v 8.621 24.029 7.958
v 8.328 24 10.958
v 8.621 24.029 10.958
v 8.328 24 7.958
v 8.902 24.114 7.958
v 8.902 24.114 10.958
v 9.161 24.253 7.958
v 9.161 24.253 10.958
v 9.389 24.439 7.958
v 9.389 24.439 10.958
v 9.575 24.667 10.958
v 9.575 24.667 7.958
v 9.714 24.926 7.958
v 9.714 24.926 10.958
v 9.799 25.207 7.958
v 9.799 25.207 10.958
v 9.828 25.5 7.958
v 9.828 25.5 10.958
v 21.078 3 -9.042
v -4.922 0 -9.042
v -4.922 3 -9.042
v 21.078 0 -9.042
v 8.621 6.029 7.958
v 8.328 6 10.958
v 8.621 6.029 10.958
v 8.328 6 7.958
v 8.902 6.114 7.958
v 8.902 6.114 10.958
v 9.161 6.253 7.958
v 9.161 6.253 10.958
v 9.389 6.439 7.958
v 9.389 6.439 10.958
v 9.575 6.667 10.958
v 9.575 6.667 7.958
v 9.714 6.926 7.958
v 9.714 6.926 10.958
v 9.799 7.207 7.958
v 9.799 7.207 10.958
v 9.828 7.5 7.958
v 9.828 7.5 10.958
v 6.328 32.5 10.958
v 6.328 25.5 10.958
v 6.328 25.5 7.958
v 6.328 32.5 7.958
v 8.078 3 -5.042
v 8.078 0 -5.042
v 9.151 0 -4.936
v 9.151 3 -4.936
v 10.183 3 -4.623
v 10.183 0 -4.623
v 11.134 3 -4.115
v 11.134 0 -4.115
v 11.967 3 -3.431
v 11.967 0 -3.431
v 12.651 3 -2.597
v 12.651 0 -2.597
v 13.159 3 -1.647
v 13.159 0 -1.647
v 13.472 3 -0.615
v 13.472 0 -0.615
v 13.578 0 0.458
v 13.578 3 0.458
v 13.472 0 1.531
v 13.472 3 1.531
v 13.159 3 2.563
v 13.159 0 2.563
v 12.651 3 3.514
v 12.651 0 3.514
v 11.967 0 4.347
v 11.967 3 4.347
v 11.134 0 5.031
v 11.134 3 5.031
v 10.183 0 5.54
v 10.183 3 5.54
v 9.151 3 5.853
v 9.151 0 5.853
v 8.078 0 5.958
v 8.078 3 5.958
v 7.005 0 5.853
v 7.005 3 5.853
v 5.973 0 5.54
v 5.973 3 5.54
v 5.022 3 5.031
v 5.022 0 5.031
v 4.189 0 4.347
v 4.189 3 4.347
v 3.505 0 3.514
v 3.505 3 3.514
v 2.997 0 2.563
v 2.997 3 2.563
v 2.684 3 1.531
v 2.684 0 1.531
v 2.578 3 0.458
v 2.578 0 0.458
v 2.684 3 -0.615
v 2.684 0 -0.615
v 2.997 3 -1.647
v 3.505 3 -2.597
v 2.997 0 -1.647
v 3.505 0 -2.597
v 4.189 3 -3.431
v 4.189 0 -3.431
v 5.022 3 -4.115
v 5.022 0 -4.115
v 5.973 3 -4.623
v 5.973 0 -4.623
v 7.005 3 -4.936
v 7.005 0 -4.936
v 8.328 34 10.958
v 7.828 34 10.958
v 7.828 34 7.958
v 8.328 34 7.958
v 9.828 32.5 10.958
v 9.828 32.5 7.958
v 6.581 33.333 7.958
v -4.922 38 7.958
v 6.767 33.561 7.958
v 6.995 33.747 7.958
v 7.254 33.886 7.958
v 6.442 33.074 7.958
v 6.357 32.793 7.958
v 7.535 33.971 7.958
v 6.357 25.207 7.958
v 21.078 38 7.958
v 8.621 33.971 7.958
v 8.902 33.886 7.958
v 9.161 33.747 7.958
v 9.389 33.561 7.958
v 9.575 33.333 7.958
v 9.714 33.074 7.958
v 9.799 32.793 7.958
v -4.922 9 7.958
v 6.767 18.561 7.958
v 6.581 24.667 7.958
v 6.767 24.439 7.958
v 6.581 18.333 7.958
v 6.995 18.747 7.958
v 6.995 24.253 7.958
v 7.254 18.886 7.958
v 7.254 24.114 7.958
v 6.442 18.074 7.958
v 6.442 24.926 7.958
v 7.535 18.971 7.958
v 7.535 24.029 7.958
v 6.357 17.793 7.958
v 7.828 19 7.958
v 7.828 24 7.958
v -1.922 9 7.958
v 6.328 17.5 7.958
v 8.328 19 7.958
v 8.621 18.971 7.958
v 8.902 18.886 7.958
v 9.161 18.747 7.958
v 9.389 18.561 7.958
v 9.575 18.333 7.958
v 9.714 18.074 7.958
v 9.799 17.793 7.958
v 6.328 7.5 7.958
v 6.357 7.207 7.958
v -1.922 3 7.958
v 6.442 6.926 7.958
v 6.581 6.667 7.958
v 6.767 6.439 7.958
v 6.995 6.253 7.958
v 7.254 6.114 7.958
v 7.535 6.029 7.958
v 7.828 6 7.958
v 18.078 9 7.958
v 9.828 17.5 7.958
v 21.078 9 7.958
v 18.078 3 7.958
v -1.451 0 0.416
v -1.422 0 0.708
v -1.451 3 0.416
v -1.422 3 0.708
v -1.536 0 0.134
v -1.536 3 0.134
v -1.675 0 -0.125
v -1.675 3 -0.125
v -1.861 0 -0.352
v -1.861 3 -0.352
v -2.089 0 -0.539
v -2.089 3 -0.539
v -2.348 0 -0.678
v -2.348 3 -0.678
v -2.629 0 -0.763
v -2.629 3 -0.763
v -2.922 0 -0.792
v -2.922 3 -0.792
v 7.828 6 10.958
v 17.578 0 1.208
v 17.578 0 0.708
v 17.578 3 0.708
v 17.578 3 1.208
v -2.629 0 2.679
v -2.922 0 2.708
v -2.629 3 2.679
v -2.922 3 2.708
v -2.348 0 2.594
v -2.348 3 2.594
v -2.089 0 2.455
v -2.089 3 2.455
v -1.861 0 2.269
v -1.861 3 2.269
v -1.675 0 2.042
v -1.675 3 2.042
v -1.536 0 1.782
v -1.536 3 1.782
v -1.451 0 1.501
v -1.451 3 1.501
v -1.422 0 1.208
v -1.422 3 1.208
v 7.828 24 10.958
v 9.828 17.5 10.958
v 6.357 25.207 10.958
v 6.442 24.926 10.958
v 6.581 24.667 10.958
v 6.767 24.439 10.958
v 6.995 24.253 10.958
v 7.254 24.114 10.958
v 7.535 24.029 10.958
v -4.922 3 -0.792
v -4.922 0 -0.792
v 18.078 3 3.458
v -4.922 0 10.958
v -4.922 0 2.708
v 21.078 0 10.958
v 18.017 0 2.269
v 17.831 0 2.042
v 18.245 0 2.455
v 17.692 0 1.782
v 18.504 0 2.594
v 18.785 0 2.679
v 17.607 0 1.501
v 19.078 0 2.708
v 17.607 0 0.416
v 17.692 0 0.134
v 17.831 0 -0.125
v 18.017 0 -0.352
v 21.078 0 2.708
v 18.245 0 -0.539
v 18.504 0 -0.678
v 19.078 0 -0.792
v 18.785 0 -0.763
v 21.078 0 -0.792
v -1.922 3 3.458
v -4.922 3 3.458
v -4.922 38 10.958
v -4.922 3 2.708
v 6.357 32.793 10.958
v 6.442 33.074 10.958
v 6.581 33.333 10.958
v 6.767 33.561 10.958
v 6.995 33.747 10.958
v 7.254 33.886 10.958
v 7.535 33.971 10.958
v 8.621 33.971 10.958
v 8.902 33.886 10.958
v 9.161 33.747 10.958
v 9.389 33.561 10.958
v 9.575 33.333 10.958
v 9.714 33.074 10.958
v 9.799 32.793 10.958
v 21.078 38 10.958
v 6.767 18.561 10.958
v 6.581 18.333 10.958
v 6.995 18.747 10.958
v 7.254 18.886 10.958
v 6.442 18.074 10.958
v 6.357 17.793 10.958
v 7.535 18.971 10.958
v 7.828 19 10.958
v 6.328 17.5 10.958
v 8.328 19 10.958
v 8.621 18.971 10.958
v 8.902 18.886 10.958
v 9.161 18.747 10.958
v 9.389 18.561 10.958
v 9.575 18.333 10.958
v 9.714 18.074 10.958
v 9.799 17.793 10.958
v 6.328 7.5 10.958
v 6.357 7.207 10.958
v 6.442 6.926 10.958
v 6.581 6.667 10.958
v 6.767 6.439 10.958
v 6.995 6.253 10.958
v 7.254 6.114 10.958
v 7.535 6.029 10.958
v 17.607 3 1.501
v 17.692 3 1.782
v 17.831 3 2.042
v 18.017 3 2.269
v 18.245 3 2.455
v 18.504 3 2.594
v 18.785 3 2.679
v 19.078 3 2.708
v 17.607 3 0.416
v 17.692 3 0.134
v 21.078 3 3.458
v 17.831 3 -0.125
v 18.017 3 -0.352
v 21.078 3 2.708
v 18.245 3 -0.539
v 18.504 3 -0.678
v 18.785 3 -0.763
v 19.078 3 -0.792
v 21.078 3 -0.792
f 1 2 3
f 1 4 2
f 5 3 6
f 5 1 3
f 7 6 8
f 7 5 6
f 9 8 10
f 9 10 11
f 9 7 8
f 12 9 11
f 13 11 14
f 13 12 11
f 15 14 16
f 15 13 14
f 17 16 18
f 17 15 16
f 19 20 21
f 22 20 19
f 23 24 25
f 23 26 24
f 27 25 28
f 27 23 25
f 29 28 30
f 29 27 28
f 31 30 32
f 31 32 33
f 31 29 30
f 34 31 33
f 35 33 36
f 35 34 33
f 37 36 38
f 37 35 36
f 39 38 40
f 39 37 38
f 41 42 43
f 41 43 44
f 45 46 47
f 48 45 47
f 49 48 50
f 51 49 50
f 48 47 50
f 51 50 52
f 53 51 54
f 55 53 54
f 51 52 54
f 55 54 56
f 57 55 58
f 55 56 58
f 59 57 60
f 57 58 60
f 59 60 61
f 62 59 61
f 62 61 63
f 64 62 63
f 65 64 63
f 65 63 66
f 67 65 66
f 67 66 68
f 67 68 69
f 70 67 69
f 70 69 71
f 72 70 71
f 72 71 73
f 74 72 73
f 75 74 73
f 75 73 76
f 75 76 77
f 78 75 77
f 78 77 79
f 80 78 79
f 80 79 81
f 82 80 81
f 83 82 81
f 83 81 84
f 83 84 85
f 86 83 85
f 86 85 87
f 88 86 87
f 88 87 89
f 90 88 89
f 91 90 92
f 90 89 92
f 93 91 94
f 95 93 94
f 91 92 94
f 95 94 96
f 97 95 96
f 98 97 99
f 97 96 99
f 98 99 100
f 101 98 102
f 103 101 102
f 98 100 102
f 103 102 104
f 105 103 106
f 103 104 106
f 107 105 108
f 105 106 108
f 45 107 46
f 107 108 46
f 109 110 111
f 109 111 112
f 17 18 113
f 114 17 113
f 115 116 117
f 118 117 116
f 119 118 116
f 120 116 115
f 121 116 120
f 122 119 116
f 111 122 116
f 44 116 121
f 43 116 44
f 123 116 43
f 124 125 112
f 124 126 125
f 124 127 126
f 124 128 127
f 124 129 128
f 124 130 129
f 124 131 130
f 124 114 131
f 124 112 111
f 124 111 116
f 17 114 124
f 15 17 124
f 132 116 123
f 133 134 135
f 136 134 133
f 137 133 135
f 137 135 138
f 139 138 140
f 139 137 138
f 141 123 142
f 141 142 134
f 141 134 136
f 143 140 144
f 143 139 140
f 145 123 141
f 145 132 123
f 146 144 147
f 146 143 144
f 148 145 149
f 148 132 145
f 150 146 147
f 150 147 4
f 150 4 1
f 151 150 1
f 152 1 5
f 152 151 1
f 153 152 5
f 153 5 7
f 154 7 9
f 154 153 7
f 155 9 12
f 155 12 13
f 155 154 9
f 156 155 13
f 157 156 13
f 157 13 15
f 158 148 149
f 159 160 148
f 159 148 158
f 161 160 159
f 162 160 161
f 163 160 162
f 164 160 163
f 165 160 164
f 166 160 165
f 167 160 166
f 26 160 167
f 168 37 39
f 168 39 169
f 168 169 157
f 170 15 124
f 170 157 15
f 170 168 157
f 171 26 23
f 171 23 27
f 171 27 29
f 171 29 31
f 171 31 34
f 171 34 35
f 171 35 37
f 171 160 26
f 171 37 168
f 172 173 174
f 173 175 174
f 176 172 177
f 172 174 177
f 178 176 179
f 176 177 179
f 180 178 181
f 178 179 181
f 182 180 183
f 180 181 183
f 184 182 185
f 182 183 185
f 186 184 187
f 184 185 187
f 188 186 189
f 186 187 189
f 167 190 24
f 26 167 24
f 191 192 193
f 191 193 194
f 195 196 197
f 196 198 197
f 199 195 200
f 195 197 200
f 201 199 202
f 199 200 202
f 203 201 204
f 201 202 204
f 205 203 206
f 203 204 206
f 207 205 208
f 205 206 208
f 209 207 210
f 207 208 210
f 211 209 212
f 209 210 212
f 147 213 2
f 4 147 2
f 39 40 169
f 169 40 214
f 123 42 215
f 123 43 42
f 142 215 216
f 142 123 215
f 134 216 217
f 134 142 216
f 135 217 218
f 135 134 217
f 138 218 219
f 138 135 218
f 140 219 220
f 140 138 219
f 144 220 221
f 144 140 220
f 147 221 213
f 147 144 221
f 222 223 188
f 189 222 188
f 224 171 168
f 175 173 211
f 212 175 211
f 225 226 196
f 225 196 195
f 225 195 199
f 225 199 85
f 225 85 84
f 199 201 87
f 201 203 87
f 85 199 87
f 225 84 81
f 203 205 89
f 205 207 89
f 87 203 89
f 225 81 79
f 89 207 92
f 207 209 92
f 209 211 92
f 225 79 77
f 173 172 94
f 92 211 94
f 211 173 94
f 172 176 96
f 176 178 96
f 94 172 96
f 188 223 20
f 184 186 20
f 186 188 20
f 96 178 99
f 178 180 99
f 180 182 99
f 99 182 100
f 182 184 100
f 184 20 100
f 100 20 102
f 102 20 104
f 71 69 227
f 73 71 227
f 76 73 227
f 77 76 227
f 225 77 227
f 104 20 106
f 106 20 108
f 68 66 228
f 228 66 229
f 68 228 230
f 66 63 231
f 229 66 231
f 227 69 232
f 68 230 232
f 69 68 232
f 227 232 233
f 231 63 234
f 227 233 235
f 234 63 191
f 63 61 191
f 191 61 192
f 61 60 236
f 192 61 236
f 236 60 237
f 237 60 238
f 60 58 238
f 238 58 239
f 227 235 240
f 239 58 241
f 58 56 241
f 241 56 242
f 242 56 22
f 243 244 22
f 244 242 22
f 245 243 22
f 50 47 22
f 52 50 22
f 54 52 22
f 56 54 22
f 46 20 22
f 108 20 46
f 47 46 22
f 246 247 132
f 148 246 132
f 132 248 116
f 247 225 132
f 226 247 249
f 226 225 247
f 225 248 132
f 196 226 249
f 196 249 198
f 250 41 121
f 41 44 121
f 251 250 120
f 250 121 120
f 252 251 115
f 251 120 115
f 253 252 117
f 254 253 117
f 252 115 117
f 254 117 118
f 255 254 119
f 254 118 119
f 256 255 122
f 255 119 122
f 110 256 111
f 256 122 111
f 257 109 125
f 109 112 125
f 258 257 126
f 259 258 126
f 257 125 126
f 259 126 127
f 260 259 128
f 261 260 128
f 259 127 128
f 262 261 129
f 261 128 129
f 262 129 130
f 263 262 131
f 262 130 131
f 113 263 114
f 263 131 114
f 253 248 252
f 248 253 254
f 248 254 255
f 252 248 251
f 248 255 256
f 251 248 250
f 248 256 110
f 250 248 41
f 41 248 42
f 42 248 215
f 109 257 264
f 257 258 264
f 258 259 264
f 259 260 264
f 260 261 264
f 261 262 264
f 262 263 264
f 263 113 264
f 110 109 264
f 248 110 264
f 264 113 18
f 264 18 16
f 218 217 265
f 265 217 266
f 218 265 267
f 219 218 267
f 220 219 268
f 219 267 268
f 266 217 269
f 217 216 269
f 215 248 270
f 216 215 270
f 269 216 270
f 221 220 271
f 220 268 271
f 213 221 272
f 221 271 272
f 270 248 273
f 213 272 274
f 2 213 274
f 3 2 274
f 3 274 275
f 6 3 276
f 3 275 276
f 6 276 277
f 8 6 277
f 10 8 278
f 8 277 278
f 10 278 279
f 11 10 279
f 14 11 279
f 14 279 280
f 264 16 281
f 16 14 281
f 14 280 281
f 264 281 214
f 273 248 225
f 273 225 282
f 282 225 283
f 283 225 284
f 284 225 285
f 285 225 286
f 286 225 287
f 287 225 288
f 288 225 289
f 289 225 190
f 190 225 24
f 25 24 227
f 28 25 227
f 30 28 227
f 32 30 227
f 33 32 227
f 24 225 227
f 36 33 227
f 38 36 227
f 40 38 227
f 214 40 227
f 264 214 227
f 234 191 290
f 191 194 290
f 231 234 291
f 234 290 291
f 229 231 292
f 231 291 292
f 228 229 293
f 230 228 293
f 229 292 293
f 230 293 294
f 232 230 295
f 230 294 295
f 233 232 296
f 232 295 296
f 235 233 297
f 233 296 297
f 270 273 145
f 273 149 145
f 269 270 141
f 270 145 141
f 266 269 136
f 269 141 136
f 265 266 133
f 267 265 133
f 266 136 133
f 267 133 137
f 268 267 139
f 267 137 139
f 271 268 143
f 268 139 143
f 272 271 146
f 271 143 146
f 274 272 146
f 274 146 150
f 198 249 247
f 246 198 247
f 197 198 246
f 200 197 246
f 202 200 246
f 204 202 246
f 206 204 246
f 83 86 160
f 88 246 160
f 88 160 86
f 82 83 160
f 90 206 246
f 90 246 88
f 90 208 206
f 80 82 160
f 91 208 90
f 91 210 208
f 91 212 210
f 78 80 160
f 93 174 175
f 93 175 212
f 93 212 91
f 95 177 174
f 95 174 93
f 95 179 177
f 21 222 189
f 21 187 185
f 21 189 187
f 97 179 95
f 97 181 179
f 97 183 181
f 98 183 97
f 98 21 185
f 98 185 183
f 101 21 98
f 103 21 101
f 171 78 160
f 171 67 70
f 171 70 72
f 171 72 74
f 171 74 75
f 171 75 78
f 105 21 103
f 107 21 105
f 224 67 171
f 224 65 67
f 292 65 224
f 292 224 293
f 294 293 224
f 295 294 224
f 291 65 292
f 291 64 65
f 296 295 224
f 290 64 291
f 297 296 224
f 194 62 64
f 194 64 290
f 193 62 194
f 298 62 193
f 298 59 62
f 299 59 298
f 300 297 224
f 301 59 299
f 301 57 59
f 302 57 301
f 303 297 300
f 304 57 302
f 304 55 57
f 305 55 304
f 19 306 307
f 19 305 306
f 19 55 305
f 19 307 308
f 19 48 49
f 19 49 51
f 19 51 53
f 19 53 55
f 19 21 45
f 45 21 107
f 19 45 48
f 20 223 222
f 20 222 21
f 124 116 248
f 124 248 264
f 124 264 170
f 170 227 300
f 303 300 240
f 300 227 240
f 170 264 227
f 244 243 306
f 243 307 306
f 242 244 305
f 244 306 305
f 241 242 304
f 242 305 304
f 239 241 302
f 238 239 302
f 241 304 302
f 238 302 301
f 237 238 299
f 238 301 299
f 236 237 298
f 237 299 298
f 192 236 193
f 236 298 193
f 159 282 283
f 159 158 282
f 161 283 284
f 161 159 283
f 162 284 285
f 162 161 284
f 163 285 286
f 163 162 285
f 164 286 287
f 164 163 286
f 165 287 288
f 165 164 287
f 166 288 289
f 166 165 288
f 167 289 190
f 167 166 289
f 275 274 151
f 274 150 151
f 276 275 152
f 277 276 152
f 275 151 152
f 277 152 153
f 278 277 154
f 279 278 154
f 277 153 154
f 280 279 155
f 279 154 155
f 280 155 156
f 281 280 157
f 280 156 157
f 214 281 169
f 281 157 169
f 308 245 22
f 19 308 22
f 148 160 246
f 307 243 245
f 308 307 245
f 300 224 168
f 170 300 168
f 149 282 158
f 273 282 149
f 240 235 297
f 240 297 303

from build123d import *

# Parameters (mm, degrees)
ESBO_O1_W                = 26
ESBO_O1_H                = 20
RESSALTO_EXTRUS_O1_DEPTH = 3
ESBO_O2_W                = 26
ESBO_O2_H                = 3
RESSALTO_EXTRUS_O2_DEPTH = 35
ESBO_O3_W                = 3
ESBO_O3_H                = 4.5
RESSALTO_EXTRUS_O3_DEPTH = 6
CORTE_EXTRUS_O1_DEPTH    = 48.329507785
CORTE_EXTRUS_O2_REACH    = 49.836
ESBO_O5_W                = 3.5
ESBO_O5_H                = 10
ESBO_O5_H_2              = 13
FILETE2_R                = 1.5
FILETE3_R                = 1.5
FILETE4_R                = 1.5
CORTE_EXTRUS_O3_REACH    = 46.815
ESBO_O6_W                = 7
ESBO_O6_H                = 3.5
FILETE5_R                = 1.5
CORTE_EXTRUS_O4_REACH    = 46.815
ESBO_O7_R                = 5.5


with BuildPart() as part:
    # Esboço1 → Ressalto-extrusão1 (new body)
    with BuildSketch(Plane(origin=(0, 0, 0), x_dir=(1, 0, 0), z_dir=(0, 1, 0))):
        with Locations((8.077993659, -0.958207295)):
            Rectangle(ESBO_O1_W, ESBO_O1_H)
    extrude(amount=RESSALTO_EXTRUS_O1_DEPTH)

    # Esboço2 → Ressalto-extrusão2 (add)
    with BuildSketch(Plane(origin=(0, 3, 0), x_dir=(1, 0, 0), z_dir=(0, 1, 0))):
        with Locations((8.077993659, -9.458207295)):
            Rectangle(ESBO_O2_W, ESBO_O2_H)
    extrude(amount=RESSALTO_EXTRUS_O2_DEPTH)

    # Esboço3 → Ressalto-extrusão3 (add)
    with BuildSketch(Plane(origin=(0, 3, 0), x_dir=(1, 0, 0), z_dir=(0, 1, 0))):
        with Locations((19.577993659, -5.708207295)):
            Rectangle(ESBO_O3_W, ESBO_O3_H)
        with Locations((-3.422006341, -5.708207295)):
            Rectangle(ESBO_O3_W, ESBO_O3_H)
    extrude(amount=RESSALTO_EXTRUS_O3_DEPTH)

    # Esboço4 → Corte-extrusão1 (cut, through all)
    with BuildSketch(Plane.ZY.offset(4.922006341)):
        Polygon((3.458207295, 3), (7.958207295, 9), (3.458207295, 9), align=None)
    extrude(amount=-CORTE_EXTRUS_O1_DEPTH, mode=Mode.SUBTRACT)

    # Esboço5 → Corte-extrusão2 (cut, up to next)
    with BuildSketch(Plane.XY.offset(10.958207295), mode=Mode.PRIVATE) as corte_extrus_o2_sk1:
        with Locations((8.077993659, 29)):
            Rectangle(ESBO_O5_W, ESBO_O5_H)
    corte_extrus_o2_tool1 = extrude(corte_extrus_o2_sk1.sketch, amount=-CORTE_EXTRUS_O2_REACH, mode=Mode.PRIVATE) & part.part
    # Esboço5 → Corte-extrusão2 (cut, up to next)
    with BuildSketch(Plane.XY.offset(10.958207295), mode=Mode.PRIVATE) as corte_extrus_o2_sk2:
        with Locations((8.077993659, 12.5)):
            Rectangle(ESBO_O5_W, ESBO_O5_H_2)
    corte_extrus_o2_tool2 = extrude(corte_extrus_o2_sk2.sketch, amount=-CORTE_EXTRUS_O2_REACH, mode=Mode.PRIVATE) & part.part
    add(corte_extrus_o2_tool1.solids().sort_by_distance((8.077994, 29, 10.958207))[0], mode=Mode.SUBTRACT)
    add(corte_extrus_o2_tool2.solids().sort_by_distance((8.077994, 12.5, 10.958207))[0], mode=Mode.SUBTRACT)

    # Filete2
    filete2_edges = [part.edges().sort_by_distance(p)[0] for p in [
        (9.827993659, 34, 9.458207295),
        (6.327993659, 34, 9.458207295),
        (9.827993659, 24, 9.458207295),
        (6.327993659, 24, 9.458207295),
        (9.827993659, 19, 9.458207295),
        (6.327993659, 19, 9.458207295),
    ]]
    fillet(filete2_edges, radius=FILETE2_R)

    # Filete3
    filete3_edges = [part.edges().sort_by_distance(p)[0] for p in [
        (6.327993659, 6, 9.458207295),
    ]]
    fillet(filete3_edges, radius=FILETE3_R)

    # Filete4
    filete4_edges = [part.edges().sort_by_distance(p)[0] for p in [
        (9.827993659, 6, 9.458207295),
    ]]
    fillet(filete4_edges, radius=FILETE4_R)

    # Esboço6 → Corte-extrusão3 (cut, up to next)
    with BuildSketch(Plane.XZ, mode=Mode.PRIVATE) as corte_extrus_o3_sk1:
        with Locations((-4.922006341, 0.958207295)):
            Rectangle(ESBO_O6_W, ESBO_O6_H)
    corte_extrus_o3_tool1 = extrude(corte_extrus_o3_sk1.sketch, amount=-CORTE_EXTRUS_O3_REACH, mode=Mode.PRIVATE) & part.part
    # Esboço6 → Corte-extrusão3 (cut, up to next)
    with BuildSketch(Plane.XZ, mode=Mode.PRIVATE) as corte_extrus_o3_sk2:
        with Locations((21.077993659, 0.958207295)):
            Rectangle(ESBO_O6_W, ESBO_O6_H)
    corte_extrus_o3_tool2 = extrude(corte_extrus_o3_sk2.sketch, amount=-CORTE_EXTRUS_O3_REACH, mode=Mode.PRIVATE) & part.part
    add(corte_extrus_o3_tool1.solids().sort_by_distance((-4.922006, 0, 0.958207))[0], mode=Mode.SUBTRACT)
    add(corte_extrus_o3_tool2.solids().sort_by_distance((21.077994, 0, 0.958207))[0], mode=Mode.SUBTRACT)

    # Filete5
    filete5_edges = [part.edges().sort_by_distance(p)[0] for p in [
        (17.577993659, 1.5, -0.791792705),
        (17.577993659, 1.5, 2.708207295),
        (-1.422006341, 1.5, -0.791792705),
        (-1.422006341, 1.5, 2.708207295),
    ]]
    fillet(filete5_edges, radius=FILETE5_R)

    # Esboço7 → Corte-extrusão4 (cut, up to next)
    with BuildSketch(Plane.XZ, mode=Mode.PRIVATE) as corte_extrus_o4_sk1:
        with Locations((8.077993659, 0.458207295)):
            Circle(ESBO_O7_R)
    corte_extrus_o4_tool1 = extrude(corte_extrus_o4_sk1.sketch, amount=-CORTE_EXTRUS_O4_REACH, mode=Mode.PRIVATE) & part.part
    add(corte_extrus_o4_tool1.solids().sort_by_distance((8.077994, 0, 0.458207))[0], mode=Mode.SUBTRACT)


solid = part.part
